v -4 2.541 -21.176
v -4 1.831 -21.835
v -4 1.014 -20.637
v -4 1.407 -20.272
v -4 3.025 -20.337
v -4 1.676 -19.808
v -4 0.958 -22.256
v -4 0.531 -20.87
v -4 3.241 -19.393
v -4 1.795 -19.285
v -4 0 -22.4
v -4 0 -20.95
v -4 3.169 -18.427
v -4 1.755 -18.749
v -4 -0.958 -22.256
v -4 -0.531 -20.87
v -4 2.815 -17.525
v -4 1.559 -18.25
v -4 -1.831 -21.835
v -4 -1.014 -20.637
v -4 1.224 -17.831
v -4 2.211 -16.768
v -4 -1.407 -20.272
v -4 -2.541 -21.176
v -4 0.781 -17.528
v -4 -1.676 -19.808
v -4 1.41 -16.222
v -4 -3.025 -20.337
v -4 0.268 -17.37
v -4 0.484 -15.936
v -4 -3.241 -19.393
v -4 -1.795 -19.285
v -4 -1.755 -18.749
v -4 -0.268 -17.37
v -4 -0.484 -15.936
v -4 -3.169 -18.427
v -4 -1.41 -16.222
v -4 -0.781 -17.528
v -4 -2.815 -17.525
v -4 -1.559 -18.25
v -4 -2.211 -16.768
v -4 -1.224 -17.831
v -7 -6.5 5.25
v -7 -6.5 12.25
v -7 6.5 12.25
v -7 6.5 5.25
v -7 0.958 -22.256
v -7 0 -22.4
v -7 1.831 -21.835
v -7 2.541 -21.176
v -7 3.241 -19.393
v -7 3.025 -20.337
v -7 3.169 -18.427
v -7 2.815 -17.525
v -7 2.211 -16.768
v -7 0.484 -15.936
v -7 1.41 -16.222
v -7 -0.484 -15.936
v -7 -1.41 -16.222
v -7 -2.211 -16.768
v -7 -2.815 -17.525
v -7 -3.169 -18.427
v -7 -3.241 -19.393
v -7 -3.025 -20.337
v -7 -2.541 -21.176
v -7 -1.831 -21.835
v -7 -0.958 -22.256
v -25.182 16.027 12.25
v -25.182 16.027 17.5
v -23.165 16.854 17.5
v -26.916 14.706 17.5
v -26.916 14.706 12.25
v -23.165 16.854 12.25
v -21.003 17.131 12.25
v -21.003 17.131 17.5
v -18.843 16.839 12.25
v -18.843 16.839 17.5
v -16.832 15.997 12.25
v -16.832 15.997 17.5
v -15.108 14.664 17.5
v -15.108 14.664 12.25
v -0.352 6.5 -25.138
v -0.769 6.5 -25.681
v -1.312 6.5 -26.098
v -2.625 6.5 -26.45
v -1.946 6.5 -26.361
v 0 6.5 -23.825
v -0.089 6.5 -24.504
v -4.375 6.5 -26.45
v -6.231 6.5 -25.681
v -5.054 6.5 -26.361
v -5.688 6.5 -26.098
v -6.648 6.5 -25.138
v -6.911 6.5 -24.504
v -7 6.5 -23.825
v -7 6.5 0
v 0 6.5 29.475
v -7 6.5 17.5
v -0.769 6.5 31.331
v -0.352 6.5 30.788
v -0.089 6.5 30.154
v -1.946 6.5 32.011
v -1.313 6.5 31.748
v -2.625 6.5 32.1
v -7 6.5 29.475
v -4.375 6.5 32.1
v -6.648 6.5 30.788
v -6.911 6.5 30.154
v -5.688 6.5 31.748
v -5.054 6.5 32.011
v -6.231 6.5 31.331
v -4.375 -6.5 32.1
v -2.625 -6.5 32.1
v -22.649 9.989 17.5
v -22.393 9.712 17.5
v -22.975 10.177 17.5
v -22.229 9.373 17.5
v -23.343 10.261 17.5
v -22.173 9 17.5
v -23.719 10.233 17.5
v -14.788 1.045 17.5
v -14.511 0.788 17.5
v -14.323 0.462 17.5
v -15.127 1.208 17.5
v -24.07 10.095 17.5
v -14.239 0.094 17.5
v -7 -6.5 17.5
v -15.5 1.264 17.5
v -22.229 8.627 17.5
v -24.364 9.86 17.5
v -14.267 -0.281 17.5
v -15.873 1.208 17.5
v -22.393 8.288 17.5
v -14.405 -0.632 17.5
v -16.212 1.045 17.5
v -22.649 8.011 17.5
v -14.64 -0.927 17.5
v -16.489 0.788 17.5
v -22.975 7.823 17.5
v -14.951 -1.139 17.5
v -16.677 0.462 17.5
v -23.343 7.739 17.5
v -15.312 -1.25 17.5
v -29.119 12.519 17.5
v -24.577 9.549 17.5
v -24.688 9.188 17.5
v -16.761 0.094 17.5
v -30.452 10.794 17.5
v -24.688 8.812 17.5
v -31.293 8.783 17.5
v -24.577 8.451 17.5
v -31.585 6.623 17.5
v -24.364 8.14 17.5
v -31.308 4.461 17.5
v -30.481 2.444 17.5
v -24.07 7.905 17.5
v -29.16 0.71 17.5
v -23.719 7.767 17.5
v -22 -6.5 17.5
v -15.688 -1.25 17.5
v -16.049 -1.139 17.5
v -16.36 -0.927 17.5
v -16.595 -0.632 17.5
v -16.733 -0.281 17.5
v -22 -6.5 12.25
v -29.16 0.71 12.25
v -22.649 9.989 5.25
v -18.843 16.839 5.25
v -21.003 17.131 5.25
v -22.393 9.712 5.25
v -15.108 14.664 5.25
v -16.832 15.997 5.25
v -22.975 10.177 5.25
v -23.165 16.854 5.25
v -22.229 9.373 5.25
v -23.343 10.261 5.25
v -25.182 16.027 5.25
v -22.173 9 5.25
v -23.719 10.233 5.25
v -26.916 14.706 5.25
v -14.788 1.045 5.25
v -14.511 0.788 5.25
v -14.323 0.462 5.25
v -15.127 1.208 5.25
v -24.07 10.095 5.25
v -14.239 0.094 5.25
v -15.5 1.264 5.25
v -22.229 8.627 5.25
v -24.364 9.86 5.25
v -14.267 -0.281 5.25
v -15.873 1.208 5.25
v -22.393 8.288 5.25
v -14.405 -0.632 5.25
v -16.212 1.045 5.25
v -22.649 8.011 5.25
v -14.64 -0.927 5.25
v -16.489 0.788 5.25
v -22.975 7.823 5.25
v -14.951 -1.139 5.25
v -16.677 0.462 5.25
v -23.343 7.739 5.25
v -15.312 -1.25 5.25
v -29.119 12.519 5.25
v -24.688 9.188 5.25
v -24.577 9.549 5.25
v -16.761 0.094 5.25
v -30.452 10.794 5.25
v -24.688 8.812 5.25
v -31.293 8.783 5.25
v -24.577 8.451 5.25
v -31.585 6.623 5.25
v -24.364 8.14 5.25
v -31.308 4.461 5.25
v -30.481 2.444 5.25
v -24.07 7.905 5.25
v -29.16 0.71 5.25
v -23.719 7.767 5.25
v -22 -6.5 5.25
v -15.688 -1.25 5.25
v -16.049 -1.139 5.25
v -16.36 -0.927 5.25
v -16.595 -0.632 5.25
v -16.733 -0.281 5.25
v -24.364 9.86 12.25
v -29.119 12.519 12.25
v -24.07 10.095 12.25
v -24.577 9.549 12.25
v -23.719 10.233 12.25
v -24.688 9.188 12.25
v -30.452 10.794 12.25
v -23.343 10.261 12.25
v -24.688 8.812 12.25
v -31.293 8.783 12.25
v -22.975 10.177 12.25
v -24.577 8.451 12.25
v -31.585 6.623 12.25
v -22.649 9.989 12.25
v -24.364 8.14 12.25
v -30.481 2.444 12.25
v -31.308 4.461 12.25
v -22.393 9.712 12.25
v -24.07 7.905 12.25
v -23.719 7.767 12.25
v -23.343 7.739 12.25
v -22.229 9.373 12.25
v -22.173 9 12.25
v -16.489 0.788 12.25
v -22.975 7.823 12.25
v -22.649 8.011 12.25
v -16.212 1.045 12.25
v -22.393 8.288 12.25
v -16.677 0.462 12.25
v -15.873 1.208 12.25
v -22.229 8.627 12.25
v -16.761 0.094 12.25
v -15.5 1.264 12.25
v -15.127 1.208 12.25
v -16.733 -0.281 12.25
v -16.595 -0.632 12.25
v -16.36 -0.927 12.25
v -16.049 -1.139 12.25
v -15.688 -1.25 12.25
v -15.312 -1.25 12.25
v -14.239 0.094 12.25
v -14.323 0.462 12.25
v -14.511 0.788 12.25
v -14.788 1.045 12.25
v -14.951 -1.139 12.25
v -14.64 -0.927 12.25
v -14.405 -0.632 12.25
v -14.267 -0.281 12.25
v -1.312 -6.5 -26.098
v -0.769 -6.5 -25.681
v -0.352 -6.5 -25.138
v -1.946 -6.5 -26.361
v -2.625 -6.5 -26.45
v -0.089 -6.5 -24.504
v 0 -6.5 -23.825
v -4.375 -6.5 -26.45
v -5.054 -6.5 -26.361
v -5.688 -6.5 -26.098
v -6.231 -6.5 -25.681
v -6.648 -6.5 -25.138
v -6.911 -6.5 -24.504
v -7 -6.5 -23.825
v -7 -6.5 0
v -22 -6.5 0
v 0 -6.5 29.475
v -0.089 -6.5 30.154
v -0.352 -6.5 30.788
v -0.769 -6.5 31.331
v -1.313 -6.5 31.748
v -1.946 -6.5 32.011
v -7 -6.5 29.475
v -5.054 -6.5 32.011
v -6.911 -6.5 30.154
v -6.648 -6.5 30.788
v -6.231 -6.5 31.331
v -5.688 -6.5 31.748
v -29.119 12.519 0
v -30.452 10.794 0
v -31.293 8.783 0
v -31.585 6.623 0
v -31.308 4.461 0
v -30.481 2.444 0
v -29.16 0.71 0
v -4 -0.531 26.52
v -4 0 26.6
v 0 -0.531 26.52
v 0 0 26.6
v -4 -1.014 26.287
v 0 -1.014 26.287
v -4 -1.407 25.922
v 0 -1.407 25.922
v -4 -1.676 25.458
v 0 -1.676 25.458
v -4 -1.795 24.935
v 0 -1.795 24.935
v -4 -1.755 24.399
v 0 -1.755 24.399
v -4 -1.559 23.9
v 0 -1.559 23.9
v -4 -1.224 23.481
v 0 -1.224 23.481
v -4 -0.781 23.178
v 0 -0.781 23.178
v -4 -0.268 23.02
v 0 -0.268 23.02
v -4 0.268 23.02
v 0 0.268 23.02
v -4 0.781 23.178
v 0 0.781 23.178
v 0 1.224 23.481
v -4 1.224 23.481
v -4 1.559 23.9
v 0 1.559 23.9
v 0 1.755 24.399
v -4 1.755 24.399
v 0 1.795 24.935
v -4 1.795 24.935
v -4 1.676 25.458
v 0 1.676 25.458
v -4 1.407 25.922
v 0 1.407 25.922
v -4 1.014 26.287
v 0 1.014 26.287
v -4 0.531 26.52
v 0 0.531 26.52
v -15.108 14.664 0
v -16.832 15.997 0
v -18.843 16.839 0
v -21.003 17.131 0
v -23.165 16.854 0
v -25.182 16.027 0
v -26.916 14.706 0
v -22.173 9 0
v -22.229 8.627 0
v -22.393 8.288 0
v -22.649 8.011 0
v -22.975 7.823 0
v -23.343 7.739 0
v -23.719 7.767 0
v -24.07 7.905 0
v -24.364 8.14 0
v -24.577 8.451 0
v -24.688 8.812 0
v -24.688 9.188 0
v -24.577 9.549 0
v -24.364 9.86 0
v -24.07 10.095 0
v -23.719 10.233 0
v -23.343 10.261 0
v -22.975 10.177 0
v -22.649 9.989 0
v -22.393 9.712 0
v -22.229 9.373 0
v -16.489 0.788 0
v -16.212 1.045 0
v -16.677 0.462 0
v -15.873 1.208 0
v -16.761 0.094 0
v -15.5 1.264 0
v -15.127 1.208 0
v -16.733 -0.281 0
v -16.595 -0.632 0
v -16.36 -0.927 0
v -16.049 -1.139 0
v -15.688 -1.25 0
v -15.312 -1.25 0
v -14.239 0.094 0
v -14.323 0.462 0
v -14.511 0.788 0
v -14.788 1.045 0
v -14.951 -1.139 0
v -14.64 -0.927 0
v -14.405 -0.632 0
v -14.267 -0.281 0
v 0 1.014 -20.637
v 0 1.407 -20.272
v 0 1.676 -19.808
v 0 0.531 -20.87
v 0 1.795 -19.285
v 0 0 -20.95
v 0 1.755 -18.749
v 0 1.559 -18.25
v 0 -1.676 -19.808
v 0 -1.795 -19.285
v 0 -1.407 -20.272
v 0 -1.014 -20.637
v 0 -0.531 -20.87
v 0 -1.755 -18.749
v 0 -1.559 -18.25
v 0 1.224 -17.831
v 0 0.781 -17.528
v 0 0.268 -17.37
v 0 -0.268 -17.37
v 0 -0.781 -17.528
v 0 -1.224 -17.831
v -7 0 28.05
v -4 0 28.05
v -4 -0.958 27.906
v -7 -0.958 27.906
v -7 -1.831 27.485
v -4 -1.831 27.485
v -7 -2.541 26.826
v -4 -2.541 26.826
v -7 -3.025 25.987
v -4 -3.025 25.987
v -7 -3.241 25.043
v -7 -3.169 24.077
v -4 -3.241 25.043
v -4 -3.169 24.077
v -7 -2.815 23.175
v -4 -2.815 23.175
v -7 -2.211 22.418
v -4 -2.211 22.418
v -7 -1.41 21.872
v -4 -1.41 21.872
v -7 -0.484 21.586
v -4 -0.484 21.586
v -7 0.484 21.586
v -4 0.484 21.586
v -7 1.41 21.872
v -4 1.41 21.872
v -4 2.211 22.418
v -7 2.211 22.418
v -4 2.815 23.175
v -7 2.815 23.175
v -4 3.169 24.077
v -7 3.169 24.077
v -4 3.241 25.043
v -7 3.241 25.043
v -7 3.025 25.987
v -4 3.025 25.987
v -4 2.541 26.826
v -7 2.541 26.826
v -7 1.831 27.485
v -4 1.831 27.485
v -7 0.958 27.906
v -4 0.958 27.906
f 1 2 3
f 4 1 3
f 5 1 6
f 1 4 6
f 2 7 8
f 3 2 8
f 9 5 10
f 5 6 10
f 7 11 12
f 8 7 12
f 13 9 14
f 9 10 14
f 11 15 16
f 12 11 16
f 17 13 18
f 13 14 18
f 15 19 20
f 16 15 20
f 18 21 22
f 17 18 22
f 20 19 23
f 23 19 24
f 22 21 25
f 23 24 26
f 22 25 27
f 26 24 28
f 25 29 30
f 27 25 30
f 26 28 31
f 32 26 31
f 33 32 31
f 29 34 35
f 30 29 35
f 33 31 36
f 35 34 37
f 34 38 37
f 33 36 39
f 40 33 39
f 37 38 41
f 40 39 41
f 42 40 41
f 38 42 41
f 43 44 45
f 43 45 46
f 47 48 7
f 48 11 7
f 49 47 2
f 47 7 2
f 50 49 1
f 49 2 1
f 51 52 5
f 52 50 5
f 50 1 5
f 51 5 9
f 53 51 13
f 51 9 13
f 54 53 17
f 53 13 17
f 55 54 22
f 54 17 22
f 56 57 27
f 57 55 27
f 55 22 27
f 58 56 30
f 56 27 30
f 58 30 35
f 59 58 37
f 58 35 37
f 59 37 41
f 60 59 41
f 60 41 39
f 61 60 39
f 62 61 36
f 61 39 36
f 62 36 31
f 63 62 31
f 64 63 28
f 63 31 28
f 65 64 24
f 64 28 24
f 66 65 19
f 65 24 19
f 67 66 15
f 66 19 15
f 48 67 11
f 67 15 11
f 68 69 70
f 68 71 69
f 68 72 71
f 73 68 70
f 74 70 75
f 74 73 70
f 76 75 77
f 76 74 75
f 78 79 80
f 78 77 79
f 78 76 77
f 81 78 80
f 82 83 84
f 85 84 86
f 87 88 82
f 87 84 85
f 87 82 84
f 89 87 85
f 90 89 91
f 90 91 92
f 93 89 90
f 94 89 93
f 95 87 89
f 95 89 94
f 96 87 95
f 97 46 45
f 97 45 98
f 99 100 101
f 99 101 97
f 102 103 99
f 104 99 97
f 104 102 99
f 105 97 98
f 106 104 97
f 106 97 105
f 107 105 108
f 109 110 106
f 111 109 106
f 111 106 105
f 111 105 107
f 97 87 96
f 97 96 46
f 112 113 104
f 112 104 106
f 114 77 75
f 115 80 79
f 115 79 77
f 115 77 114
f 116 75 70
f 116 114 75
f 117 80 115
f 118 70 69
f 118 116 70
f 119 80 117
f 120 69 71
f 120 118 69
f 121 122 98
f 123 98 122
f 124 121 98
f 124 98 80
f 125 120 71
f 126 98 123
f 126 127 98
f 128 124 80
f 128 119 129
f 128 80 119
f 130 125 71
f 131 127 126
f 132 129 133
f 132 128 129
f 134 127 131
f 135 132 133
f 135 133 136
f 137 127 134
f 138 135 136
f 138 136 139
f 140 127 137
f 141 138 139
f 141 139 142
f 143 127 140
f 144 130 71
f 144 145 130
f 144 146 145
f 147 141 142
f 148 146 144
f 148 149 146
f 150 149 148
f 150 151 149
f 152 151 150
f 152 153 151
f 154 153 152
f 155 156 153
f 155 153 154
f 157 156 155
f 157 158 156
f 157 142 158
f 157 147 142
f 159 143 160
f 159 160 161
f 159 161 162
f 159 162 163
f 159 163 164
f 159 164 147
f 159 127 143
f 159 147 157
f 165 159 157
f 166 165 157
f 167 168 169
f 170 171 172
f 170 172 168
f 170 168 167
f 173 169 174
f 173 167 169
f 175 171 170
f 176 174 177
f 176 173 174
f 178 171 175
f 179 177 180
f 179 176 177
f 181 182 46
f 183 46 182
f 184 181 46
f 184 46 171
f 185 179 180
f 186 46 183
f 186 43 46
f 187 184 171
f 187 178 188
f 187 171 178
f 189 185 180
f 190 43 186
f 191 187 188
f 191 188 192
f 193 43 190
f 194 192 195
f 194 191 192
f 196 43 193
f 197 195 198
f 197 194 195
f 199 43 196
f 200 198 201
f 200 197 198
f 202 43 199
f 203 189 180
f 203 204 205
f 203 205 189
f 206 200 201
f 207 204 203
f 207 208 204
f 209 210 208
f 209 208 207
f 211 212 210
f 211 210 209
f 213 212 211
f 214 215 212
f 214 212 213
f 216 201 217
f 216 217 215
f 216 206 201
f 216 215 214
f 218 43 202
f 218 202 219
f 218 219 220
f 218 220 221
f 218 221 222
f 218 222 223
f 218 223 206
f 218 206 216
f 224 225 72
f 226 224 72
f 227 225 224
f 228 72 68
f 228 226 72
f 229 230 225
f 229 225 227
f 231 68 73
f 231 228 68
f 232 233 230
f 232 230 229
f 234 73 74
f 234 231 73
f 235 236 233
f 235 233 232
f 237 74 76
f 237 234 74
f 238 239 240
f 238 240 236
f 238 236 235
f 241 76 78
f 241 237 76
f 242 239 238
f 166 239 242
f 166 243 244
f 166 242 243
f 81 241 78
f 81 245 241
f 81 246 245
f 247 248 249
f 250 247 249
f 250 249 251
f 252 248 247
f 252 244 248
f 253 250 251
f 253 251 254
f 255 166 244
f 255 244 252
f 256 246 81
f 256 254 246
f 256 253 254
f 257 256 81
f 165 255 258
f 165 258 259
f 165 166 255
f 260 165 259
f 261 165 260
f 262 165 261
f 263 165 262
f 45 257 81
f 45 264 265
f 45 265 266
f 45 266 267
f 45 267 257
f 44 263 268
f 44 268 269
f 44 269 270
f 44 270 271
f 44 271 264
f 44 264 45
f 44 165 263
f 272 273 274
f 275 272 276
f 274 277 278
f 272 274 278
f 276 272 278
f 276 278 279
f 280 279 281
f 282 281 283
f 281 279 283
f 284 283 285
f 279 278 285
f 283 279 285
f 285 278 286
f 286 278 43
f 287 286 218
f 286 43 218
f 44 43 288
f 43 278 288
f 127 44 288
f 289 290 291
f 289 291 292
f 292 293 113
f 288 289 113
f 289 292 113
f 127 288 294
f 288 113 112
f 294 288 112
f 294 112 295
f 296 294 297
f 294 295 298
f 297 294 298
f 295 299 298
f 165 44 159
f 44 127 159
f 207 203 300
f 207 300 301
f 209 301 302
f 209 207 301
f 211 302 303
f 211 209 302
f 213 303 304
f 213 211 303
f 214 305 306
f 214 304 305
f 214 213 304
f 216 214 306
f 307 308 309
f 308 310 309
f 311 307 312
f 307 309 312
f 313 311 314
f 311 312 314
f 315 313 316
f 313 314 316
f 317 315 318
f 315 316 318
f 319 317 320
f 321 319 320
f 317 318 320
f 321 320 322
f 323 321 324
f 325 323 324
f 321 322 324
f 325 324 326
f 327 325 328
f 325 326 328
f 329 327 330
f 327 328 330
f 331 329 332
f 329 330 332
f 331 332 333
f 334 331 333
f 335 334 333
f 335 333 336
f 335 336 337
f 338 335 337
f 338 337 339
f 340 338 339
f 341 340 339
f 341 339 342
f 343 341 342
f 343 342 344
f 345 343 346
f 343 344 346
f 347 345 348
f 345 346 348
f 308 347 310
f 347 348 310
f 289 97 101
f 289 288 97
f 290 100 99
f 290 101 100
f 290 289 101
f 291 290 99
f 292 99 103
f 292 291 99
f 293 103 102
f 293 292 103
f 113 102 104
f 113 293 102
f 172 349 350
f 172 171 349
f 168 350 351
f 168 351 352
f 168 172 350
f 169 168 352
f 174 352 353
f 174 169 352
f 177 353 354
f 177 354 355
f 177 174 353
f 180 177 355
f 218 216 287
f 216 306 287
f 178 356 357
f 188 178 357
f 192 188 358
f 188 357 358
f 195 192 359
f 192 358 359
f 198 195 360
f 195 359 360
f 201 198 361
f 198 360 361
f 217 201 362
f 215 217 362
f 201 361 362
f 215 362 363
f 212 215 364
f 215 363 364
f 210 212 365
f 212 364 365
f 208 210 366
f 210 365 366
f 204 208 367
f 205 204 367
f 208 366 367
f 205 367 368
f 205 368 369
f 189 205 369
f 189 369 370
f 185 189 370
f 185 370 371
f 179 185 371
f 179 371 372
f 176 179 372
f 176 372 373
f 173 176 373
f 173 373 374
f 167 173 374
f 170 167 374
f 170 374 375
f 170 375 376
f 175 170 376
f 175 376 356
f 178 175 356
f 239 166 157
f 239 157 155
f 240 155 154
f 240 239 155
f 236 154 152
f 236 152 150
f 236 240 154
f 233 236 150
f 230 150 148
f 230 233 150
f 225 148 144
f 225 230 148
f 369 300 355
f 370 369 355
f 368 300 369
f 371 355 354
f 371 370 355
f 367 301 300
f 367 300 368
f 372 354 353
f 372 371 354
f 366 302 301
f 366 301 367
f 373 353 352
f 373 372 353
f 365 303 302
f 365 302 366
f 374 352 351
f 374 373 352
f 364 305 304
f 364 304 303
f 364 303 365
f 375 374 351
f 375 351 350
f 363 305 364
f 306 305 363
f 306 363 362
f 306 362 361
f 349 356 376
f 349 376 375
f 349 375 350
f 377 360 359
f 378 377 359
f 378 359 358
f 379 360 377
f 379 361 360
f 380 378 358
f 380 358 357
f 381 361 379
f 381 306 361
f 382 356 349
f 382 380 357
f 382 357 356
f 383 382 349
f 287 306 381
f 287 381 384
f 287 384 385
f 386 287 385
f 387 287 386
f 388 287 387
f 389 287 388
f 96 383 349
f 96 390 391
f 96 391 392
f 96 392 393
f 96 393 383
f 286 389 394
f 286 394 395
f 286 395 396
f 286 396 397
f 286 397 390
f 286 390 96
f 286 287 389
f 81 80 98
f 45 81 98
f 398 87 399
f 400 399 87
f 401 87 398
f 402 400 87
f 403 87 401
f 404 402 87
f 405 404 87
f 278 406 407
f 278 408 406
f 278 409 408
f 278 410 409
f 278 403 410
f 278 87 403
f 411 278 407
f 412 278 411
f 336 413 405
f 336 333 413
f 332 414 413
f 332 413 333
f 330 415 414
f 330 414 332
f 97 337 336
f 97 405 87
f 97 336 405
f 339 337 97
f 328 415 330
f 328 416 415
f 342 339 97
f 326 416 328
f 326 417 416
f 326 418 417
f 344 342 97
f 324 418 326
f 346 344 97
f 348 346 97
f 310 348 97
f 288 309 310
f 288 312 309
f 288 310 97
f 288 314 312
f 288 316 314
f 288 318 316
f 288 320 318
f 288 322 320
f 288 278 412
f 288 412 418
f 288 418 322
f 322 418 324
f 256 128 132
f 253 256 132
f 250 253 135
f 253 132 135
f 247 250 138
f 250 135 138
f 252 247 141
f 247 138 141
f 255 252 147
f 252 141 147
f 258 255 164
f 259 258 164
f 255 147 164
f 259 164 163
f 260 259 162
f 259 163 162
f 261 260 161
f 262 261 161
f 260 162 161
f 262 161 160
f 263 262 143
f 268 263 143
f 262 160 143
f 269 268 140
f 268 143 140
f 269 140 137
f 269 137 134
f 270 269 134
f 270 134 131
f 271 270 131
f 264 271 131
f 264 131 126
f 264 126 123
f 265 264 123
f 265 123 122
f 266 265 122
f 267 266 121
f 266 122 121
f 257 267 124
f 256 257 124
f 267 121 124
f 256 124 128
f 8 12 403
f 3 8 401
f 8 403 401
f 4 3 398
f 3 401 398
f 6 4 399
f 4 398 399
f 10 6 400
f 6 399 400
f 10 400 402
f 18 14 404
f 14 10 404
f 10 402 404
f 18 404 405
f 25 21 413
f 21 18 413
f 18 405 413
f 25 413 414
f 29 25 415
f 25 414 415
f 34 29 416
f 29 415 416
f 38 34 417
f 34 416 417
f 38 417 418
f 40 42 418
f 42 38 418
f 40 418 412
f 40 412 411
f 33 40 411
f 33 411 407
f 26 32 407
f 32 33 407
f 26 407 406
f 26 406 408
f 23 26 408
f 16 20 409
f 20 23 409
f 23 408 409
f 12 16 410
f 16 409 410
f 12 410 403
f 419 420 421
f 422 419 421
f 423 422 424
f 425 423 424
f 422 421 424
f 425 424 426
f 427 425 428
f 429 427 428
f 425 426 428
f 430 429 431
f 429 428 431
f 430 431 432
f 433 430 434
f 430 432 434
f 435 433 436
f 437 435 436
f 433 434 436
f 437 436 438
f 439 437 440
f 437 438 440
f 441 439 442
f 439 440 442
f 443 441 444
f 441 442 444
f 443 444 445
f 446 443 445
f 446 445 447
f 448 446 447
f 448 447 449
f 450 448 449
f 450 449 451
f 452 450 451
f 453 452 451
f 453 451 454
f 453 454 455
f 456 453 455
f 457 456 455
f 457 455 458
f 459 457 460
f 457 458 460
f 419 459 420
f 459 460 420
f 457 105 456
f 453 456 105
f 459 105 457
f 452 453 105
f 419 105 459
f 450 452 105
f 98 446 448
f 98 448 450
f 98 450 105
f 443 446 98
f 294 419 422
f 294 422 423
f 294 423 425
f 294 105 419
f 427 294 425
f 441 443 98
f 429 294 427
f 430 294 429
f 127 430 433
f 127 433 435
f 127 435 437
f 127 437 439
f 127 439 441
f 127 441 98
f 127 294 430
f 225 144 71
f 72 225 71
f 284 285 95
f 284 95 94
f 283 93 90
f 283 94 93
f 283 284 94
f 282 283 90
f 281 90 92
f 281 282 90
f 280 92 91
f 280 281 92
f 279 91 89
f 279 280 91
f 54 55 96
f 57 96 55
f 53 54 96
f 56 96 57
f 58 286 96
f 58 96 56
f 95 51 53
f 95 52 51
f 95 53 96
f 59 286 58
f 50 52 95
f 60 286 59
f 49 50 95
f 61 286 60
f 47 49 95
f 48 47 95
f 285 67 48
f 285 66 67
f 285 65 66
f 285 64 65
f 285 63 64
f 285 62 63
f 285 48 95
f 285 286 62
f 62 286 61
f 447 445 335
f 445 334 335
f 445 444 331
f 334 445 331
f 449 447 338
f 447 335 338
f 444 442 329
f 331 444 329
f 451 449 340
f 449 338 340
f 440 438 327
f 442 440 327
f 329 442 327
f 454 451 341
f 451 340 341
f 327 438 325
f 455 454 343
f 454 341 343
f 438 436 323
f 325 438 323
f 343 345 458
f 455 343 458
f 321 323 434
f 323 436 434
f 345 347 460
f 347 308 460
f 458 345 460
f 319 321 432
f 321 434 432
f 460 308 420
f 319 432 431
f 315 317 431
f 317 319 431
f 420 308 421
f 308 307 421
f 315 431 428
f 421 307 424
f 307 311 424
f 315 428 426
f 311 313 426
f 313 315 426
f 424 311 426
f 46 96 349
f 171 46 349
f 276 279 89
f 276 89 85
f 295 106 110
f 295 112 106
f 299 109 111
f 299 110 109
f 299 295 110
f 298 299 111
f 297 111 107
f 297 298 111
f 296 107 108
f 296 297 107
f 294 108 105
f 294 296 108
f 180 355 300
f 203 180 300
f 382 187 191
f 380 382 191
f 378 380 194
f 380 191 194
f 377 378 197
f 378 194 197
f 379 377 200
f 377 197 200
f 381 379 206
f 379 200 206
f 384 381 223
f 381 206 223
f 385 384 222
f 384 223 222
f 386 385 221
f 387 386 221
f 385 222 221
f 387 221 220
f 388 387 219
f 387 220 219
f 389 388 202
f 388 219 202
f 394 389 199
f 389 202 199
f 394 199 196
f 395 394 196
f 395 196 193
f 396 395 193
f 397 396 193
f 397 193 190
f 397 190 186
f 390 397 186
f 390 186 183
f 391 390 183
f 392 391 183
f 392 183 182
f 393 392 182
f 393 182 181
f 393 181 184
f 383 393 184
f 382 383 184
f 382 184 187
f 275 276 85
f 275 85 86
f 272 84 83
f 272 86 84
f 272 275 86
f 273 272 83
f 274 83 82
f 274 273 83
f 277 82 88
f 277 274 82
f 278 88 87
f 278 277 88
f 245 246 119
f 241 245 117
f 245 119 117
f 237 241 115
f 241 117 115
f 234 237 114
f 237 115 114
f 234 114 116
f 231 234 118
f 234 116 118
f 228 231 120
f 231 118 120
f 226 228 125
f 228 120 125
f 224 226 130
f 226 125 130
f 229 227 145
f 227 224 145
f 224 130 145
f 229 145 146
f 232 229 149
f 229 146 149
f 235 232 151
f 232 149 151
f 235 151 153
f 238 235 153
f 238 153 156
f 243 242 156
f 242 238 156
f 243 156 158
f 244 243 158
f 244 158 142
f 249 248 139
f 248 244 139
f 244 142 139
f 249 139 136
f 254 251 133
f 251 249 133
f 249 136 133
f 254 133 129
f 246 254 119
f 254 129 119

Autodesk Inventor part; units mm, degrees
ref_plane "Work Plane1" through (0, -6.5, 0) normal (0, 1, 0) x (-1, 0, 0)
sketch "Sketch1" plane through (0, -6.5, 0) normal (0, 1, 0) x (-1, 0, 0)
  line L0 (0, 0) -> (0, 29.475)
  arc A0 (2.625, 32.1) -> (0, 29.475) centre (2.625, 29.475) ccw
  line L1 (7, 29.475) -> (7, 17.5)
  line L2 (22, 12.25) -> (7, 12.25)
  line L3 (2.625, 32.1) -> (4.375, 32.1)
  line L4 (7, 12.25) -> (7, 5.25)
  arc A1 (7, 29.475) -> (4.375, 32.1) centre (4.375, 29.475) ccw
  line L5 (7, 17.5) -> (22, 17.5)
  line L6 (22, 0) -> (0, 0)
  line L7 (7, 5.25) -> (22, 5.25)
  line L8 (0, 0) -> (7, 0)
  line L9 (7, 0) -> (7, -23.825)
  line L10 (4.375, -26.45) -> (2.625, -26.45)
  line L11 (0, -23.825) -> (0, 0)
  arc A2 (0, -23.825) -> (2.625, -26.45) centre (2.625, -23.825) ccw
  arc A3 (4.375, -26.45) -> (7, -23.825) centre (4.375, -23.825) ccw
  line L12 (22, 17.5) -> (22, 12.25)
  line L13 (22, 5.25) -> (22, 0)
  point P0 (0, 0)
  point P1 (7, 0)
  dimension "d35" = 7
  dimension "d36" = 7
  dimension "d38" = 5.25
  dimension "d39" = 14.6
  dimension "d48" = 2.625
  dimension "d49" = 2.625
  dimension "d50" = 23.825
  dimension "d53" = 15
extrude "Extrusion2" add sketch "Sketch1" along normal blind 13
hole "Hole3" at (-15.5, 0, 12.25) direction (0, 0, 1) diameter 2.529 depth 5.25
sketch "Sketch3" plane through (-7, -6.5, 12.25) normal (0, 0, -1) x (-1, 0, 0)
  line L0 (0, 0) -> (0, 13) projected
  line L1 (0, 13) -> (15, 13) projected
  point P0 (8.5, 6.5)
  point P1 (12.375, 13)
  dimension "d51" = 8.5
  dimension "d52" = 6.5
hole "Hole1" at (-15.5, 0, 0) direction (0, 0, 1) diameter 2.529 depth 5.25
sketch "Sketch6" plane through (-19.375, -6.5, 17.5) normal (0, 0, 1) x (1, 0, 0)
  circle A0 centre (-4.0623, 15.5) radius 4.5
  circle A1 centre (3.875, 6.5) radius 4.5
  circle A2 centre (3.875, 6.5) radius 1.2645 projected
  line L0 (-2.625, 0) -> (12.375, 0) projected
  line L1 (12.375, 0) -> (12.375, 13) projected
  line L2 (-2.625, 13) -> (12.375, 13) projected
  circle A3 centre (3.875, 6.5) radius 1.2645 projected
  circle A4 centre (-4.0623, 15.5) radius 6.5
  circle A5 centre (3.875, 6.5) radius 6.5
  line L3 (3.875, 11) -> (-4.0623, 11)
  line L4 (0, 0) -> (0, 0)
  line L5 (0, 0) -> (0, 13)
  line L6 (0, 13) -> (0, 13)
  line L7 (0, 0) -> (0, 13)
  line L8 (-2.625, 0) -> (-2.625, 13.3311)
  line L9 (-2.625, 0) -> (-15.6685, 13.1351)
  line L10 (-15.6685, 13.1351) -> (-1.6162, 27.0894)
  line L11 (12.375, 0) -> (12.375, 13) projected
  line L12 (-1.6162, 27.0894) -> (12.375, 13)
  line L13 (2.9639, 22.4772) -> (-11.0884, 8.5228)
  circle A6 centre (-4.0623, 15.5) radius 1.2645
  line L14 (-2.625, 0) -> (-2.625, 13) projected
  point P0 (19.375, 6.5)
  point P1 (-2.625, 11)
  point P2 (-0.8154, 11)
  point P3 (-2.625, 1.1851)
  point P4 (3.875, 13)
  point P5 (3.875, 0)
  point P6 (-2.625, 11)
  point P7 (-2.625, 6.5)
  dimension "d26" = 9
  dimension "d27" = 9
  dimension "d28" = 2
  dimension "d29" = 2
  dimension "d30" = 1
extrude "Extrusion4" add sketch "Sketch6" against normal up to surface (5.25 mm away) contours A0 L2 L8 L13 A6 | A0 L13 A4 L2 | L13 A6 A0 | A0 L13 A4 | L2 L5 A5 L3 L8 A0 | A0 L8 L2 | A0 L3 L8 A4 L13 | L13 L12 L2 A4 | A4 L10 L12 L13 | L8 L3 A0 | L2 A4 A5 L5 | L13 L9 L10 A4 | A4 L8 L9 L13 | L3 A5 A4 L8 | L2 A5 A4 | L5 L3 A5 | A5 A4 L3 L5 | A4 A5 L8 | L1 L0 A5 L2 | L3 L5 A4 A5 | A5 L5 A1 L3 A4 | L3 A4 L5 | A4 L5 A1 A5 | A5 L5 L0 L8 | L3 A1 L5 A4 | A5 L0 L5 | A1 L5 | L5 A1
ref_plane "Work Plane2" through (-7, -6.5, 8.75) normal (0, 0, -1) x (-1, 0, 0)
mirror "Mirror1" about plane through (-7, -6.5, 8.75) normal (0, 0, -1) of "Extrusion4"
fillet "Fillet1" radius 8.35 4 edges at (-35.0435, 6.6351, 14.875) (-20.9912, 20.5894, 14.875) (-20.9912, 20.5894, 2.625) (-35.0435, 6.6351, 2.625)
sketch "Sketch8" plane through (-7, -6.5, 5.25) normal (-1, 0, 0) x (0, 0, 1)
  line L0 (0, 0) -> (7, 0) projected
  line L1 (7, 0) -> (7, 13) projected
  line L2 (0, 13) -> (7, 13) projected
  line L3 (0, 0) -> (0, 13) projected
  line L4 (12.25, 0) -> (24.225, 0) projected
  line L5 (24.225, 0) -> (24.225, 13) projected
  line L6 (12.25, 13) -> (24.225, 13) projected
  line L7 (12.25, 0) -> (12.25, 13) projected
  line L8 (24.225, 0) -> (26.85, 0) projected
  line L9 (26.85, 0) -> (26.85, 13) projected
  line L10 (24.225, 13) -> (26.85, 13) projected
  line L11 (24.225, 0) -> (24.225, 13) projected
  line L12 (26.85, 0) -> (26.85, 13) construction
  line L13 (26.85, 13) -> (12.25, 0) construction
  point P0 (-5.25, 6.5)
  point P1 (19.55, 6.5)
  point P2 (19.55, 6.5)
hole "Hole5" at (-7, 0, 24.8) direction (1, 0, 0) diameter 3.6 end through all counterbore diameter 6.5 counterbore depth 3 clearance for "Socket Head Cap Screw" size "M3" standard "Ansi Metric M Profile"
ref_plane "Work Plane3" through (-2.625, -6.5, 2.825) normal (0, 0, -1) x (-1, 0, 0)
mirror "Mirror2" about plane through (-2.625, -6.5, 2.825) normal (0, 0, -1) of "Hole5"
sketch "Sketch5" plane through (0, -6.5, 0) normal (0, 0, -1) x (-1, 0, 0)
  circle A0 centre (15.5, 6.5) radius 1.2645 projected
ref_plane "Work Plane4" through (-2.625, -6.5, 2.825) normal (0, 0, -1) x (-1, 0, 0)
properties part number "Idle belt holder"
